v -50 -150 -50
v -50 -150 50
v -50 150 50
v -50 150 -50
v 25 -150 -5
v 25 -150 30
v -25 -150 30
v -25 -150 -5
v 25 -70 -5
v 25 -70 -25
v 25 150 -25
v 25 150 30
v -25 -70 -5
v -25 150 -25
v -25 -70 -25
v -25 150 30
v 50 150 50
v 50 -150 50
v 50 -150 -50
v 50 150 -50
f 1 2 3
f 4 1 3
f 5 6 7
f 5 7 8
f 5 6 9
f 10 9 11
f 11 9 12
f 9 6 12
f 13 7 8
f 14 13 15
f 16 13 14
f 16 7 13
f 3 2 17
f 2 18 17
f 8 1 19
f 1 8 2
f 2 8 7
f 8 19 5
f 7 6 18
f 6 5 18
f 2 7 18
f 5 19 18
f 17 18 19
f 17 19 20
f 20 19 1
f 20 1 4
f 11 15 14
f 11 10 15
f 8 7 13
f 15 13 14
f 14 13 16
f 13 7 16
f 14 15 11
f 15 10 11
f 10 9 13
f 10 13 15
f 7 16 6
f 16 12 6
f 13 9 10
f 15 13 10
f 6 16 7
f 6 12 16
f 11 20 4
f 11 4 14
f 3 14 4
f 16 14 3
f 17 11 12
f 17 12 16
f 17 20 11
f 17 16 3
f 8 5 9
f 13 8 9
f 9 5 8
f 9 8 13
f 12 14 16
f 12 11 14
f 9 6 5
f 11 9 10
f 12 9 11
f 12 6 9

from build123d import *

# Parameters (mm, degrees)
F0_W     = 300
F0_H     = 100
F1_DEPTH = 50
F3_DEPTH = 25


with BuildPart() as f1:
    # F0 (on Right) → F1 (new body, symmetric)
    with BuildSketch(Plane.YZ):
        Rectangle(F0_W, F0_H)
    extrude(amount=F1_DEPTH, both=True)


with BuildPart() as f3:
    # F2 (on Right) → F3 (new body, symmetric)
    with BuildSketch(Plane.YZ):
        Polygon((150, 30), (-150, 30), (-150, -5), (-70, -5), (-70, -25), (150, -25), align=None)
    extrude(amount=F3_DEPTH, both=True)


with BuildPart() as f1_1:
    add(f1.part)

    # F4: cut F3
    add(f3.part, mode=Mode.SUBTRACT)


solid = Compound([f3.part, f1_1.part])
